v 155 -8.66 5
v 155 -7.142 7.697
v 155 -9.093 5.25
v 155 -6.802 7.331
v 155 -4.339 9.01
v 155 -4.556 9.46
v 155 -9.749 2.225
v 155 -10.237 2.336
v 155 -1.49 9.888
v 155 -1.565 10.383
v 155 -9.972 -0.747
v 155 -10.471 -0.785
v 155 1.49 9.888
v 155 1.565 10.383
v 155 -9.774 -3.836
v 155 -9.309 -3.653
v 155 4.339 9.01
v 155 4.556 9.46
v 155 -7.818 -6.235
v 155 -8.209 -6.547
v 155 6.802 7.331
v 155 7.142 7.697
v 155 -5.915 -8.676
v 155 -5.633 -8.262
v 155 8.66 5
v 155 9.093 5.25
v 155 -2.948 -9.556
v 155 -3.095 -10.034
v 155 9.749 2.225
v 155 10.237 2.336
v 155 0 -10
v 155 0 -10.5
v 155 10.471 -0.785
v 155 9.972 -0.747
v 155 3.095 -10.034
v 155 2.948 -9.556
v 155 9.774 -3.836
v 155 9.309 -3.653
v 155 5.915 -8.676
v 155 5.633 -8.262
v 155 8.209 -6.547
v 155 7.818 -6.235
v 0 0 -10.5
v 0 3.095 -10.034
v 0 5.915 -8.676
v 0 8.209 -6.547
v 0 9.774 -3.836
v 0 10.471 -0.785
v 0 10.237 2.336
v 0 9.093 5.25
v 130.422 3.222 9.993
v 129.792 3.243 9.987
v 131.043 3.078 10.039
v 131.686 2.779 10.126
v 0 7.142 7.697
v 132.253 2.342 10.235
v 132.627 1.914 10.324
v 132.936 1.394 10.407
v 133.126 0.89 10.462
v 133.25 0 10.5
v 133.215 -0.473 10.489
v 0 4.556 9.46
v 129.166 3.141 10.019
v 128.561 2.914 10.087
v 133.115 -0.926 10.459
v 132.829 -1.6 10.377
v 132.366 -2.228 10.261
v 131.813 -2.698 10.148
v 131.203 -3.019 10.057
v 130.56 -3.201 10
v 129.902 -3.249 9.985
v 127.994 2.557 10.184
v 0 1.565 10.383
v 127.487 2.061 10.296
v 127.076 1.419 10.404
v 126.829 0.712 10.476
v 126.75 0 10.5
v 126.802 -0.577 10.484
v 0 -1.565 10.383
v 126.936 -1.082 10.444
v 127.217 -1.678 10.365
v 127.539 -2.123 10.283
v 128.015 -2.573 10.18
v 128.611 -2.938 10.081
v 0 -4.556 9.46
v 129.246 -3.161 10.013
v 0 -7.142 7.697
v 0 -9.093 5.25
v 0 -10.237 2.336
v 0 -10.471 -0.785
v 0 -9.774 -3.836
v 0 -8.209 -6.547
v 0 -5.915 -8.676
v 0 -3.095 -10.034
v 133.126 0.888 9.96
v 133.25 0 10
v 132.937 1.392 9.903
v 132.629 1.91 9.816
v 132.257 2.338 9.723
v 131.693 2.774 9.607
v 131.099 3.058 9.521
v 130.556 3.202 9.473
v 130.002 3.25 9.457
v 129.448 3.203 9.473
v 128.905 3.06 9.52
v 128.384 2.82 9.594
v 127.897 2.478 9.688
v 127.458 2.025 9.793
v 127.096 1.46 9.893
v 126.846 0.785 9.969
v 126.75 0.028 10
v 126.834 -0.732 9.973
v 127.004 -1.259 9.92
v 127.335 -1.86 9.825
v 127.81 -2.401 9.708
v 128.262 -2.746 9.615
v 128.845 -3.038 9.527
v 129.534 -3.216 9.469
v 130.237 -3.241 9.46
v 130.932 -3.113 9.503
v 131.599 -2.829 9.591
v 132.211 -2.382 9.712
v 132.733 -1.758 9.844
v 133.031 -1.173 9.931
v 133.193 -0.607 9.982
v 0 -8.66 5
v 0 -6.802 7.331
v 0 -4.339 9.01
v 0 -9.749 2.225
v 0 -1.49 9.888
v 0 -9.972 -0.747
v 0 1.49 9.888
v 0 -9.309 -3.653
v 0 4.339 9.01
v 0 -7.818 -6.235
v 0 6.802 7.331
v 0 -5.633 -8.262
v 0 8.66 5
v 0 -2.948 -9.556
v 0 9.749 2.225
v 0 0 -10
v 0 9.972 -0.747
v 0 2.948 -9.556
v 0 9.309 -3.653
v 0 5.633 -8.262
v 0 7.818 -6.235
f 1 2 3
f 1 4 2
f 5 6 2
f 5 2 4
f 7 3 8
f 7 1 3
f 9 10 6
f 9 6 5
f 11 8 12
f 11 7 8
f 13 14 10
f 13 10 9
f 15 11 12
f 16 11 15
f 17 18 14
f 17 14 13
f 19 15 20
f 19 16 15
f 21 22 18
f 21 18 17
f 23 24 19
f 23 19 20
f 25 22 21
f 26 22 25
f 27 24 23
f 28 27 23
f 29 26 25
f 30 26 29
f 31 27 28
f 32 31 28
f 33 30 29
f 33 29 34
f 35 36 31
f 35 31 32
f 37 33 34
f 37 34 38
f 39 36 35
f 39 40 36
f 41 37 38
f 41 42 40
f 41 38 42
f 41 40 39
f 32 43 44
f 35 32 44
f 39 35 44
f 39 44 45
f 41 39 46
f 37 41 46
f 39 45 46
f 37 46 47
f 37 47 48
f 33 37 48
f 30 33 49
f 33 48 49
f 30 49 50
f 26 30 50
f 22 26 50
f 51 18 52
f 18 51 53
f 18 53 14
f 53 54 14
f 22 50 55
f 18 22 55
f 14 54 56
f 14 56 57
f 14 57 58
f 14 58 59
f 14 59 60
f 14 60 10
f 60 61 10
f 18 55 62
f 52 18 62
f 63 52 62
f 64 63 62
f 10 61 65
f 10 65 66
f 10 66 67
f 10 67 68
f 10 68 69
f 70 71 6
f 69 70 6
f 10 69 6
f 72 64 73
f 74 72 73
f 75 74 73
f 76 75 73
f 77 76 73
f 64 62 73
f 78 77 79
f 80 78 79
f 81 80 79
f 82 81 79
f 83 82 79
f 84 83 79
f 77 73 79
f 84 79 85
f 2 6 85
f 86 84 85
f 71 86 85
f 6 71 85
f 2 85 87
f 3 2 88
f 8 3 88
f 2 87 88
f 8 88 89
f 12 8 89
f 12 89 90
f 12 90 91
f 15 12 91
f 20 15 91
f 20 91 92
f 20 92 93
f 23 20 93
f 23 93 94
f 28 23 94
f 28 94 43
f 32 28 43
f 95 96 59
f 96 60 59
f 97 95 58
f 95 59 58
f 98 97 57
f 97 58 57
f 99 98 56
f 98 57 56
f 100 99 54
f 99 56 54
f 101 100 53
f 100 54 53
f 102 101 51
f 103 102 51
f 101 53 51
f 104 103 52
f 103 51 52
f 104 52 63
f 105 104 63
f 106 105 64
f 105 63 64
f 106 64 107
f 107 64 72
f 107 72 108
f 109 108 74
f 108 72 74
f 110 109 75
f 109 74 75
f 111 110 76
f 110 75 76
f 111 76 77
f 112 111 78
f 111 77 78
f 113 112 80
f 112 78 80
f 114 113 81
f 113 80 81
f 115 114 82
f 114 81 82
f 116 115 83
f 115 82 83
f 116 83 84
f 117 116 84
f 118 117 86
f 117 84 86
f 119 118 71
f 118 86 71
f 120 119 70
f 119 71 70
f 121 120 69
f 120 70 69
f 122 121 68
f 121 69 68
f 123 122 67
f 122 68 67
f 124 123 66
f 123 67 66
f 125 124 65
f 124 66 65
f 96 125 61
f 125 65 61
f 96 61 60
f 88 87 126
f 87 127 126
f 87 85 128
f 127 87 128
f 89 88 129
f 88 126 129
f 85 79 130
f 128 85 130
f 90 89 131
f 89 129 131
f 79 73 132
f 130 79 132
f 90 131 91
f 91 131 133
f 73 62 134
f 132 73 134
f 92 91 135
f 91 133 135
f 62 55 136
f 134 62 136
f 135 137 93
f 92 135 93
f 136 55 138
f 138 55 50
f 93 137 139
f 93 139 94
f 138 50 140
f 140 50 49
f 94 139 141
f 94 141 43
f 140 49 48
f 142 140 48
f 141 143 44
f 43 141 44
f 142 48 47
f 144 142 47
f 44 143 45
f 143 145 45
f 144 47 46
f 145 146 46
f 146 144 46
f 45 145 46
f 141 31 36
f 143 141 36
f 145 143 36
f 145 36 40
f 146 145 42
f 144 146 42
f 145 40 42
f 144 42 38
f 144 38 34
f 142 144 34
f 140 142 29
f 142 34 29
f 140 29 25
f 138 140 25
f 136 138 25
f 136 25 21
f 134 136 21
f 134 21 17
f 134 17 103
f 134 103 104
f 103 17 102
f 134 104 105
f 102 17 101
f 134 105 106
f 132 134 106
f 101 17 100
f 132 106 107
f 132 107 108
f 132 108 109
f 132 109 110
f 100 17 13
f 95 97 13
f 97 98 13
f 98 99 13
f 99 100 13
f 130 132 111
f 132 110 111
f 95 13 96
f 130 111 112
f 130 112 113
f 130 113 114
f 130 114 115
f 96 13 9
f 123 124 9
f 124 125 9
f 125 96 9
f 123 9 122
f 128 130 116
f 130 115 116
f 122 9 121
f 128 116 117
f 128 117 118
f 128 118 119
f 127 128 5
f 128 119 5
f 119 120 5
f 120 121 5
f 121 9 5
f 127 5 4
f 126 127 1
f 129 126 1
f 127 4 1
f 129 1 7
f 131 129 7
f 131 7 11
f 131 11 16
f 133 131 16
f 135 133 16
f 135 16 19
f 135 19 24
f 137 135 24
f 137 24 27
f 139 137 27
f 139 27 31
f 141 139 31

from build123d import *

# Parameters (mm, degrees)
CROQUIS1_R              = 10.5
SALIENTE_EXTRUIR1_DEPTH = 155
CROQUIS2_R              = 10
CORTAR_EXTRUIR1_DEPTH   = 155
CROQUIS3_R              = 3.25
CORTAR_EXTRUIR2_DEPTH   = 2.5


with BuildPart() as part:
    # Croquis1 → Saliente-Extruir1 (new body)
    with BuildSketch(Plane(origin=(0, 0, 0), x_dir=(0, 0, -1), z_dir=(1, 0, 0))):
        Circle(CROQUIS1_R)
    extrude(amount=SALIENTE_EXTRUIR1_DEPTH)

    # Croquis2 → Cortar-Extruir1 (cut)
    with BuildSketch(Plane(origin=(155, 0, 0), x_dir=(0, 0, -1), z_dir=(1, 0, 0))):
        Circle(CROQUIS2_R)
    extrude(amount=-CORTAR_EXTRUIR1_DEPTH, mode=Mode.SUBTRACT)

    # Croquis3 → Cortar-Extruir2 (cut, symmetric)
    with BuildSketch(Plane.XY.offset(10.369970807)):
        with Locations((130, 0)):
            Circle(CROQUIS3_R)
    extrude(amount=CORTAR_EXTRUIR2_DEPTH, both=True, mode=Mode.SUBTRACT)


solid = part.part
